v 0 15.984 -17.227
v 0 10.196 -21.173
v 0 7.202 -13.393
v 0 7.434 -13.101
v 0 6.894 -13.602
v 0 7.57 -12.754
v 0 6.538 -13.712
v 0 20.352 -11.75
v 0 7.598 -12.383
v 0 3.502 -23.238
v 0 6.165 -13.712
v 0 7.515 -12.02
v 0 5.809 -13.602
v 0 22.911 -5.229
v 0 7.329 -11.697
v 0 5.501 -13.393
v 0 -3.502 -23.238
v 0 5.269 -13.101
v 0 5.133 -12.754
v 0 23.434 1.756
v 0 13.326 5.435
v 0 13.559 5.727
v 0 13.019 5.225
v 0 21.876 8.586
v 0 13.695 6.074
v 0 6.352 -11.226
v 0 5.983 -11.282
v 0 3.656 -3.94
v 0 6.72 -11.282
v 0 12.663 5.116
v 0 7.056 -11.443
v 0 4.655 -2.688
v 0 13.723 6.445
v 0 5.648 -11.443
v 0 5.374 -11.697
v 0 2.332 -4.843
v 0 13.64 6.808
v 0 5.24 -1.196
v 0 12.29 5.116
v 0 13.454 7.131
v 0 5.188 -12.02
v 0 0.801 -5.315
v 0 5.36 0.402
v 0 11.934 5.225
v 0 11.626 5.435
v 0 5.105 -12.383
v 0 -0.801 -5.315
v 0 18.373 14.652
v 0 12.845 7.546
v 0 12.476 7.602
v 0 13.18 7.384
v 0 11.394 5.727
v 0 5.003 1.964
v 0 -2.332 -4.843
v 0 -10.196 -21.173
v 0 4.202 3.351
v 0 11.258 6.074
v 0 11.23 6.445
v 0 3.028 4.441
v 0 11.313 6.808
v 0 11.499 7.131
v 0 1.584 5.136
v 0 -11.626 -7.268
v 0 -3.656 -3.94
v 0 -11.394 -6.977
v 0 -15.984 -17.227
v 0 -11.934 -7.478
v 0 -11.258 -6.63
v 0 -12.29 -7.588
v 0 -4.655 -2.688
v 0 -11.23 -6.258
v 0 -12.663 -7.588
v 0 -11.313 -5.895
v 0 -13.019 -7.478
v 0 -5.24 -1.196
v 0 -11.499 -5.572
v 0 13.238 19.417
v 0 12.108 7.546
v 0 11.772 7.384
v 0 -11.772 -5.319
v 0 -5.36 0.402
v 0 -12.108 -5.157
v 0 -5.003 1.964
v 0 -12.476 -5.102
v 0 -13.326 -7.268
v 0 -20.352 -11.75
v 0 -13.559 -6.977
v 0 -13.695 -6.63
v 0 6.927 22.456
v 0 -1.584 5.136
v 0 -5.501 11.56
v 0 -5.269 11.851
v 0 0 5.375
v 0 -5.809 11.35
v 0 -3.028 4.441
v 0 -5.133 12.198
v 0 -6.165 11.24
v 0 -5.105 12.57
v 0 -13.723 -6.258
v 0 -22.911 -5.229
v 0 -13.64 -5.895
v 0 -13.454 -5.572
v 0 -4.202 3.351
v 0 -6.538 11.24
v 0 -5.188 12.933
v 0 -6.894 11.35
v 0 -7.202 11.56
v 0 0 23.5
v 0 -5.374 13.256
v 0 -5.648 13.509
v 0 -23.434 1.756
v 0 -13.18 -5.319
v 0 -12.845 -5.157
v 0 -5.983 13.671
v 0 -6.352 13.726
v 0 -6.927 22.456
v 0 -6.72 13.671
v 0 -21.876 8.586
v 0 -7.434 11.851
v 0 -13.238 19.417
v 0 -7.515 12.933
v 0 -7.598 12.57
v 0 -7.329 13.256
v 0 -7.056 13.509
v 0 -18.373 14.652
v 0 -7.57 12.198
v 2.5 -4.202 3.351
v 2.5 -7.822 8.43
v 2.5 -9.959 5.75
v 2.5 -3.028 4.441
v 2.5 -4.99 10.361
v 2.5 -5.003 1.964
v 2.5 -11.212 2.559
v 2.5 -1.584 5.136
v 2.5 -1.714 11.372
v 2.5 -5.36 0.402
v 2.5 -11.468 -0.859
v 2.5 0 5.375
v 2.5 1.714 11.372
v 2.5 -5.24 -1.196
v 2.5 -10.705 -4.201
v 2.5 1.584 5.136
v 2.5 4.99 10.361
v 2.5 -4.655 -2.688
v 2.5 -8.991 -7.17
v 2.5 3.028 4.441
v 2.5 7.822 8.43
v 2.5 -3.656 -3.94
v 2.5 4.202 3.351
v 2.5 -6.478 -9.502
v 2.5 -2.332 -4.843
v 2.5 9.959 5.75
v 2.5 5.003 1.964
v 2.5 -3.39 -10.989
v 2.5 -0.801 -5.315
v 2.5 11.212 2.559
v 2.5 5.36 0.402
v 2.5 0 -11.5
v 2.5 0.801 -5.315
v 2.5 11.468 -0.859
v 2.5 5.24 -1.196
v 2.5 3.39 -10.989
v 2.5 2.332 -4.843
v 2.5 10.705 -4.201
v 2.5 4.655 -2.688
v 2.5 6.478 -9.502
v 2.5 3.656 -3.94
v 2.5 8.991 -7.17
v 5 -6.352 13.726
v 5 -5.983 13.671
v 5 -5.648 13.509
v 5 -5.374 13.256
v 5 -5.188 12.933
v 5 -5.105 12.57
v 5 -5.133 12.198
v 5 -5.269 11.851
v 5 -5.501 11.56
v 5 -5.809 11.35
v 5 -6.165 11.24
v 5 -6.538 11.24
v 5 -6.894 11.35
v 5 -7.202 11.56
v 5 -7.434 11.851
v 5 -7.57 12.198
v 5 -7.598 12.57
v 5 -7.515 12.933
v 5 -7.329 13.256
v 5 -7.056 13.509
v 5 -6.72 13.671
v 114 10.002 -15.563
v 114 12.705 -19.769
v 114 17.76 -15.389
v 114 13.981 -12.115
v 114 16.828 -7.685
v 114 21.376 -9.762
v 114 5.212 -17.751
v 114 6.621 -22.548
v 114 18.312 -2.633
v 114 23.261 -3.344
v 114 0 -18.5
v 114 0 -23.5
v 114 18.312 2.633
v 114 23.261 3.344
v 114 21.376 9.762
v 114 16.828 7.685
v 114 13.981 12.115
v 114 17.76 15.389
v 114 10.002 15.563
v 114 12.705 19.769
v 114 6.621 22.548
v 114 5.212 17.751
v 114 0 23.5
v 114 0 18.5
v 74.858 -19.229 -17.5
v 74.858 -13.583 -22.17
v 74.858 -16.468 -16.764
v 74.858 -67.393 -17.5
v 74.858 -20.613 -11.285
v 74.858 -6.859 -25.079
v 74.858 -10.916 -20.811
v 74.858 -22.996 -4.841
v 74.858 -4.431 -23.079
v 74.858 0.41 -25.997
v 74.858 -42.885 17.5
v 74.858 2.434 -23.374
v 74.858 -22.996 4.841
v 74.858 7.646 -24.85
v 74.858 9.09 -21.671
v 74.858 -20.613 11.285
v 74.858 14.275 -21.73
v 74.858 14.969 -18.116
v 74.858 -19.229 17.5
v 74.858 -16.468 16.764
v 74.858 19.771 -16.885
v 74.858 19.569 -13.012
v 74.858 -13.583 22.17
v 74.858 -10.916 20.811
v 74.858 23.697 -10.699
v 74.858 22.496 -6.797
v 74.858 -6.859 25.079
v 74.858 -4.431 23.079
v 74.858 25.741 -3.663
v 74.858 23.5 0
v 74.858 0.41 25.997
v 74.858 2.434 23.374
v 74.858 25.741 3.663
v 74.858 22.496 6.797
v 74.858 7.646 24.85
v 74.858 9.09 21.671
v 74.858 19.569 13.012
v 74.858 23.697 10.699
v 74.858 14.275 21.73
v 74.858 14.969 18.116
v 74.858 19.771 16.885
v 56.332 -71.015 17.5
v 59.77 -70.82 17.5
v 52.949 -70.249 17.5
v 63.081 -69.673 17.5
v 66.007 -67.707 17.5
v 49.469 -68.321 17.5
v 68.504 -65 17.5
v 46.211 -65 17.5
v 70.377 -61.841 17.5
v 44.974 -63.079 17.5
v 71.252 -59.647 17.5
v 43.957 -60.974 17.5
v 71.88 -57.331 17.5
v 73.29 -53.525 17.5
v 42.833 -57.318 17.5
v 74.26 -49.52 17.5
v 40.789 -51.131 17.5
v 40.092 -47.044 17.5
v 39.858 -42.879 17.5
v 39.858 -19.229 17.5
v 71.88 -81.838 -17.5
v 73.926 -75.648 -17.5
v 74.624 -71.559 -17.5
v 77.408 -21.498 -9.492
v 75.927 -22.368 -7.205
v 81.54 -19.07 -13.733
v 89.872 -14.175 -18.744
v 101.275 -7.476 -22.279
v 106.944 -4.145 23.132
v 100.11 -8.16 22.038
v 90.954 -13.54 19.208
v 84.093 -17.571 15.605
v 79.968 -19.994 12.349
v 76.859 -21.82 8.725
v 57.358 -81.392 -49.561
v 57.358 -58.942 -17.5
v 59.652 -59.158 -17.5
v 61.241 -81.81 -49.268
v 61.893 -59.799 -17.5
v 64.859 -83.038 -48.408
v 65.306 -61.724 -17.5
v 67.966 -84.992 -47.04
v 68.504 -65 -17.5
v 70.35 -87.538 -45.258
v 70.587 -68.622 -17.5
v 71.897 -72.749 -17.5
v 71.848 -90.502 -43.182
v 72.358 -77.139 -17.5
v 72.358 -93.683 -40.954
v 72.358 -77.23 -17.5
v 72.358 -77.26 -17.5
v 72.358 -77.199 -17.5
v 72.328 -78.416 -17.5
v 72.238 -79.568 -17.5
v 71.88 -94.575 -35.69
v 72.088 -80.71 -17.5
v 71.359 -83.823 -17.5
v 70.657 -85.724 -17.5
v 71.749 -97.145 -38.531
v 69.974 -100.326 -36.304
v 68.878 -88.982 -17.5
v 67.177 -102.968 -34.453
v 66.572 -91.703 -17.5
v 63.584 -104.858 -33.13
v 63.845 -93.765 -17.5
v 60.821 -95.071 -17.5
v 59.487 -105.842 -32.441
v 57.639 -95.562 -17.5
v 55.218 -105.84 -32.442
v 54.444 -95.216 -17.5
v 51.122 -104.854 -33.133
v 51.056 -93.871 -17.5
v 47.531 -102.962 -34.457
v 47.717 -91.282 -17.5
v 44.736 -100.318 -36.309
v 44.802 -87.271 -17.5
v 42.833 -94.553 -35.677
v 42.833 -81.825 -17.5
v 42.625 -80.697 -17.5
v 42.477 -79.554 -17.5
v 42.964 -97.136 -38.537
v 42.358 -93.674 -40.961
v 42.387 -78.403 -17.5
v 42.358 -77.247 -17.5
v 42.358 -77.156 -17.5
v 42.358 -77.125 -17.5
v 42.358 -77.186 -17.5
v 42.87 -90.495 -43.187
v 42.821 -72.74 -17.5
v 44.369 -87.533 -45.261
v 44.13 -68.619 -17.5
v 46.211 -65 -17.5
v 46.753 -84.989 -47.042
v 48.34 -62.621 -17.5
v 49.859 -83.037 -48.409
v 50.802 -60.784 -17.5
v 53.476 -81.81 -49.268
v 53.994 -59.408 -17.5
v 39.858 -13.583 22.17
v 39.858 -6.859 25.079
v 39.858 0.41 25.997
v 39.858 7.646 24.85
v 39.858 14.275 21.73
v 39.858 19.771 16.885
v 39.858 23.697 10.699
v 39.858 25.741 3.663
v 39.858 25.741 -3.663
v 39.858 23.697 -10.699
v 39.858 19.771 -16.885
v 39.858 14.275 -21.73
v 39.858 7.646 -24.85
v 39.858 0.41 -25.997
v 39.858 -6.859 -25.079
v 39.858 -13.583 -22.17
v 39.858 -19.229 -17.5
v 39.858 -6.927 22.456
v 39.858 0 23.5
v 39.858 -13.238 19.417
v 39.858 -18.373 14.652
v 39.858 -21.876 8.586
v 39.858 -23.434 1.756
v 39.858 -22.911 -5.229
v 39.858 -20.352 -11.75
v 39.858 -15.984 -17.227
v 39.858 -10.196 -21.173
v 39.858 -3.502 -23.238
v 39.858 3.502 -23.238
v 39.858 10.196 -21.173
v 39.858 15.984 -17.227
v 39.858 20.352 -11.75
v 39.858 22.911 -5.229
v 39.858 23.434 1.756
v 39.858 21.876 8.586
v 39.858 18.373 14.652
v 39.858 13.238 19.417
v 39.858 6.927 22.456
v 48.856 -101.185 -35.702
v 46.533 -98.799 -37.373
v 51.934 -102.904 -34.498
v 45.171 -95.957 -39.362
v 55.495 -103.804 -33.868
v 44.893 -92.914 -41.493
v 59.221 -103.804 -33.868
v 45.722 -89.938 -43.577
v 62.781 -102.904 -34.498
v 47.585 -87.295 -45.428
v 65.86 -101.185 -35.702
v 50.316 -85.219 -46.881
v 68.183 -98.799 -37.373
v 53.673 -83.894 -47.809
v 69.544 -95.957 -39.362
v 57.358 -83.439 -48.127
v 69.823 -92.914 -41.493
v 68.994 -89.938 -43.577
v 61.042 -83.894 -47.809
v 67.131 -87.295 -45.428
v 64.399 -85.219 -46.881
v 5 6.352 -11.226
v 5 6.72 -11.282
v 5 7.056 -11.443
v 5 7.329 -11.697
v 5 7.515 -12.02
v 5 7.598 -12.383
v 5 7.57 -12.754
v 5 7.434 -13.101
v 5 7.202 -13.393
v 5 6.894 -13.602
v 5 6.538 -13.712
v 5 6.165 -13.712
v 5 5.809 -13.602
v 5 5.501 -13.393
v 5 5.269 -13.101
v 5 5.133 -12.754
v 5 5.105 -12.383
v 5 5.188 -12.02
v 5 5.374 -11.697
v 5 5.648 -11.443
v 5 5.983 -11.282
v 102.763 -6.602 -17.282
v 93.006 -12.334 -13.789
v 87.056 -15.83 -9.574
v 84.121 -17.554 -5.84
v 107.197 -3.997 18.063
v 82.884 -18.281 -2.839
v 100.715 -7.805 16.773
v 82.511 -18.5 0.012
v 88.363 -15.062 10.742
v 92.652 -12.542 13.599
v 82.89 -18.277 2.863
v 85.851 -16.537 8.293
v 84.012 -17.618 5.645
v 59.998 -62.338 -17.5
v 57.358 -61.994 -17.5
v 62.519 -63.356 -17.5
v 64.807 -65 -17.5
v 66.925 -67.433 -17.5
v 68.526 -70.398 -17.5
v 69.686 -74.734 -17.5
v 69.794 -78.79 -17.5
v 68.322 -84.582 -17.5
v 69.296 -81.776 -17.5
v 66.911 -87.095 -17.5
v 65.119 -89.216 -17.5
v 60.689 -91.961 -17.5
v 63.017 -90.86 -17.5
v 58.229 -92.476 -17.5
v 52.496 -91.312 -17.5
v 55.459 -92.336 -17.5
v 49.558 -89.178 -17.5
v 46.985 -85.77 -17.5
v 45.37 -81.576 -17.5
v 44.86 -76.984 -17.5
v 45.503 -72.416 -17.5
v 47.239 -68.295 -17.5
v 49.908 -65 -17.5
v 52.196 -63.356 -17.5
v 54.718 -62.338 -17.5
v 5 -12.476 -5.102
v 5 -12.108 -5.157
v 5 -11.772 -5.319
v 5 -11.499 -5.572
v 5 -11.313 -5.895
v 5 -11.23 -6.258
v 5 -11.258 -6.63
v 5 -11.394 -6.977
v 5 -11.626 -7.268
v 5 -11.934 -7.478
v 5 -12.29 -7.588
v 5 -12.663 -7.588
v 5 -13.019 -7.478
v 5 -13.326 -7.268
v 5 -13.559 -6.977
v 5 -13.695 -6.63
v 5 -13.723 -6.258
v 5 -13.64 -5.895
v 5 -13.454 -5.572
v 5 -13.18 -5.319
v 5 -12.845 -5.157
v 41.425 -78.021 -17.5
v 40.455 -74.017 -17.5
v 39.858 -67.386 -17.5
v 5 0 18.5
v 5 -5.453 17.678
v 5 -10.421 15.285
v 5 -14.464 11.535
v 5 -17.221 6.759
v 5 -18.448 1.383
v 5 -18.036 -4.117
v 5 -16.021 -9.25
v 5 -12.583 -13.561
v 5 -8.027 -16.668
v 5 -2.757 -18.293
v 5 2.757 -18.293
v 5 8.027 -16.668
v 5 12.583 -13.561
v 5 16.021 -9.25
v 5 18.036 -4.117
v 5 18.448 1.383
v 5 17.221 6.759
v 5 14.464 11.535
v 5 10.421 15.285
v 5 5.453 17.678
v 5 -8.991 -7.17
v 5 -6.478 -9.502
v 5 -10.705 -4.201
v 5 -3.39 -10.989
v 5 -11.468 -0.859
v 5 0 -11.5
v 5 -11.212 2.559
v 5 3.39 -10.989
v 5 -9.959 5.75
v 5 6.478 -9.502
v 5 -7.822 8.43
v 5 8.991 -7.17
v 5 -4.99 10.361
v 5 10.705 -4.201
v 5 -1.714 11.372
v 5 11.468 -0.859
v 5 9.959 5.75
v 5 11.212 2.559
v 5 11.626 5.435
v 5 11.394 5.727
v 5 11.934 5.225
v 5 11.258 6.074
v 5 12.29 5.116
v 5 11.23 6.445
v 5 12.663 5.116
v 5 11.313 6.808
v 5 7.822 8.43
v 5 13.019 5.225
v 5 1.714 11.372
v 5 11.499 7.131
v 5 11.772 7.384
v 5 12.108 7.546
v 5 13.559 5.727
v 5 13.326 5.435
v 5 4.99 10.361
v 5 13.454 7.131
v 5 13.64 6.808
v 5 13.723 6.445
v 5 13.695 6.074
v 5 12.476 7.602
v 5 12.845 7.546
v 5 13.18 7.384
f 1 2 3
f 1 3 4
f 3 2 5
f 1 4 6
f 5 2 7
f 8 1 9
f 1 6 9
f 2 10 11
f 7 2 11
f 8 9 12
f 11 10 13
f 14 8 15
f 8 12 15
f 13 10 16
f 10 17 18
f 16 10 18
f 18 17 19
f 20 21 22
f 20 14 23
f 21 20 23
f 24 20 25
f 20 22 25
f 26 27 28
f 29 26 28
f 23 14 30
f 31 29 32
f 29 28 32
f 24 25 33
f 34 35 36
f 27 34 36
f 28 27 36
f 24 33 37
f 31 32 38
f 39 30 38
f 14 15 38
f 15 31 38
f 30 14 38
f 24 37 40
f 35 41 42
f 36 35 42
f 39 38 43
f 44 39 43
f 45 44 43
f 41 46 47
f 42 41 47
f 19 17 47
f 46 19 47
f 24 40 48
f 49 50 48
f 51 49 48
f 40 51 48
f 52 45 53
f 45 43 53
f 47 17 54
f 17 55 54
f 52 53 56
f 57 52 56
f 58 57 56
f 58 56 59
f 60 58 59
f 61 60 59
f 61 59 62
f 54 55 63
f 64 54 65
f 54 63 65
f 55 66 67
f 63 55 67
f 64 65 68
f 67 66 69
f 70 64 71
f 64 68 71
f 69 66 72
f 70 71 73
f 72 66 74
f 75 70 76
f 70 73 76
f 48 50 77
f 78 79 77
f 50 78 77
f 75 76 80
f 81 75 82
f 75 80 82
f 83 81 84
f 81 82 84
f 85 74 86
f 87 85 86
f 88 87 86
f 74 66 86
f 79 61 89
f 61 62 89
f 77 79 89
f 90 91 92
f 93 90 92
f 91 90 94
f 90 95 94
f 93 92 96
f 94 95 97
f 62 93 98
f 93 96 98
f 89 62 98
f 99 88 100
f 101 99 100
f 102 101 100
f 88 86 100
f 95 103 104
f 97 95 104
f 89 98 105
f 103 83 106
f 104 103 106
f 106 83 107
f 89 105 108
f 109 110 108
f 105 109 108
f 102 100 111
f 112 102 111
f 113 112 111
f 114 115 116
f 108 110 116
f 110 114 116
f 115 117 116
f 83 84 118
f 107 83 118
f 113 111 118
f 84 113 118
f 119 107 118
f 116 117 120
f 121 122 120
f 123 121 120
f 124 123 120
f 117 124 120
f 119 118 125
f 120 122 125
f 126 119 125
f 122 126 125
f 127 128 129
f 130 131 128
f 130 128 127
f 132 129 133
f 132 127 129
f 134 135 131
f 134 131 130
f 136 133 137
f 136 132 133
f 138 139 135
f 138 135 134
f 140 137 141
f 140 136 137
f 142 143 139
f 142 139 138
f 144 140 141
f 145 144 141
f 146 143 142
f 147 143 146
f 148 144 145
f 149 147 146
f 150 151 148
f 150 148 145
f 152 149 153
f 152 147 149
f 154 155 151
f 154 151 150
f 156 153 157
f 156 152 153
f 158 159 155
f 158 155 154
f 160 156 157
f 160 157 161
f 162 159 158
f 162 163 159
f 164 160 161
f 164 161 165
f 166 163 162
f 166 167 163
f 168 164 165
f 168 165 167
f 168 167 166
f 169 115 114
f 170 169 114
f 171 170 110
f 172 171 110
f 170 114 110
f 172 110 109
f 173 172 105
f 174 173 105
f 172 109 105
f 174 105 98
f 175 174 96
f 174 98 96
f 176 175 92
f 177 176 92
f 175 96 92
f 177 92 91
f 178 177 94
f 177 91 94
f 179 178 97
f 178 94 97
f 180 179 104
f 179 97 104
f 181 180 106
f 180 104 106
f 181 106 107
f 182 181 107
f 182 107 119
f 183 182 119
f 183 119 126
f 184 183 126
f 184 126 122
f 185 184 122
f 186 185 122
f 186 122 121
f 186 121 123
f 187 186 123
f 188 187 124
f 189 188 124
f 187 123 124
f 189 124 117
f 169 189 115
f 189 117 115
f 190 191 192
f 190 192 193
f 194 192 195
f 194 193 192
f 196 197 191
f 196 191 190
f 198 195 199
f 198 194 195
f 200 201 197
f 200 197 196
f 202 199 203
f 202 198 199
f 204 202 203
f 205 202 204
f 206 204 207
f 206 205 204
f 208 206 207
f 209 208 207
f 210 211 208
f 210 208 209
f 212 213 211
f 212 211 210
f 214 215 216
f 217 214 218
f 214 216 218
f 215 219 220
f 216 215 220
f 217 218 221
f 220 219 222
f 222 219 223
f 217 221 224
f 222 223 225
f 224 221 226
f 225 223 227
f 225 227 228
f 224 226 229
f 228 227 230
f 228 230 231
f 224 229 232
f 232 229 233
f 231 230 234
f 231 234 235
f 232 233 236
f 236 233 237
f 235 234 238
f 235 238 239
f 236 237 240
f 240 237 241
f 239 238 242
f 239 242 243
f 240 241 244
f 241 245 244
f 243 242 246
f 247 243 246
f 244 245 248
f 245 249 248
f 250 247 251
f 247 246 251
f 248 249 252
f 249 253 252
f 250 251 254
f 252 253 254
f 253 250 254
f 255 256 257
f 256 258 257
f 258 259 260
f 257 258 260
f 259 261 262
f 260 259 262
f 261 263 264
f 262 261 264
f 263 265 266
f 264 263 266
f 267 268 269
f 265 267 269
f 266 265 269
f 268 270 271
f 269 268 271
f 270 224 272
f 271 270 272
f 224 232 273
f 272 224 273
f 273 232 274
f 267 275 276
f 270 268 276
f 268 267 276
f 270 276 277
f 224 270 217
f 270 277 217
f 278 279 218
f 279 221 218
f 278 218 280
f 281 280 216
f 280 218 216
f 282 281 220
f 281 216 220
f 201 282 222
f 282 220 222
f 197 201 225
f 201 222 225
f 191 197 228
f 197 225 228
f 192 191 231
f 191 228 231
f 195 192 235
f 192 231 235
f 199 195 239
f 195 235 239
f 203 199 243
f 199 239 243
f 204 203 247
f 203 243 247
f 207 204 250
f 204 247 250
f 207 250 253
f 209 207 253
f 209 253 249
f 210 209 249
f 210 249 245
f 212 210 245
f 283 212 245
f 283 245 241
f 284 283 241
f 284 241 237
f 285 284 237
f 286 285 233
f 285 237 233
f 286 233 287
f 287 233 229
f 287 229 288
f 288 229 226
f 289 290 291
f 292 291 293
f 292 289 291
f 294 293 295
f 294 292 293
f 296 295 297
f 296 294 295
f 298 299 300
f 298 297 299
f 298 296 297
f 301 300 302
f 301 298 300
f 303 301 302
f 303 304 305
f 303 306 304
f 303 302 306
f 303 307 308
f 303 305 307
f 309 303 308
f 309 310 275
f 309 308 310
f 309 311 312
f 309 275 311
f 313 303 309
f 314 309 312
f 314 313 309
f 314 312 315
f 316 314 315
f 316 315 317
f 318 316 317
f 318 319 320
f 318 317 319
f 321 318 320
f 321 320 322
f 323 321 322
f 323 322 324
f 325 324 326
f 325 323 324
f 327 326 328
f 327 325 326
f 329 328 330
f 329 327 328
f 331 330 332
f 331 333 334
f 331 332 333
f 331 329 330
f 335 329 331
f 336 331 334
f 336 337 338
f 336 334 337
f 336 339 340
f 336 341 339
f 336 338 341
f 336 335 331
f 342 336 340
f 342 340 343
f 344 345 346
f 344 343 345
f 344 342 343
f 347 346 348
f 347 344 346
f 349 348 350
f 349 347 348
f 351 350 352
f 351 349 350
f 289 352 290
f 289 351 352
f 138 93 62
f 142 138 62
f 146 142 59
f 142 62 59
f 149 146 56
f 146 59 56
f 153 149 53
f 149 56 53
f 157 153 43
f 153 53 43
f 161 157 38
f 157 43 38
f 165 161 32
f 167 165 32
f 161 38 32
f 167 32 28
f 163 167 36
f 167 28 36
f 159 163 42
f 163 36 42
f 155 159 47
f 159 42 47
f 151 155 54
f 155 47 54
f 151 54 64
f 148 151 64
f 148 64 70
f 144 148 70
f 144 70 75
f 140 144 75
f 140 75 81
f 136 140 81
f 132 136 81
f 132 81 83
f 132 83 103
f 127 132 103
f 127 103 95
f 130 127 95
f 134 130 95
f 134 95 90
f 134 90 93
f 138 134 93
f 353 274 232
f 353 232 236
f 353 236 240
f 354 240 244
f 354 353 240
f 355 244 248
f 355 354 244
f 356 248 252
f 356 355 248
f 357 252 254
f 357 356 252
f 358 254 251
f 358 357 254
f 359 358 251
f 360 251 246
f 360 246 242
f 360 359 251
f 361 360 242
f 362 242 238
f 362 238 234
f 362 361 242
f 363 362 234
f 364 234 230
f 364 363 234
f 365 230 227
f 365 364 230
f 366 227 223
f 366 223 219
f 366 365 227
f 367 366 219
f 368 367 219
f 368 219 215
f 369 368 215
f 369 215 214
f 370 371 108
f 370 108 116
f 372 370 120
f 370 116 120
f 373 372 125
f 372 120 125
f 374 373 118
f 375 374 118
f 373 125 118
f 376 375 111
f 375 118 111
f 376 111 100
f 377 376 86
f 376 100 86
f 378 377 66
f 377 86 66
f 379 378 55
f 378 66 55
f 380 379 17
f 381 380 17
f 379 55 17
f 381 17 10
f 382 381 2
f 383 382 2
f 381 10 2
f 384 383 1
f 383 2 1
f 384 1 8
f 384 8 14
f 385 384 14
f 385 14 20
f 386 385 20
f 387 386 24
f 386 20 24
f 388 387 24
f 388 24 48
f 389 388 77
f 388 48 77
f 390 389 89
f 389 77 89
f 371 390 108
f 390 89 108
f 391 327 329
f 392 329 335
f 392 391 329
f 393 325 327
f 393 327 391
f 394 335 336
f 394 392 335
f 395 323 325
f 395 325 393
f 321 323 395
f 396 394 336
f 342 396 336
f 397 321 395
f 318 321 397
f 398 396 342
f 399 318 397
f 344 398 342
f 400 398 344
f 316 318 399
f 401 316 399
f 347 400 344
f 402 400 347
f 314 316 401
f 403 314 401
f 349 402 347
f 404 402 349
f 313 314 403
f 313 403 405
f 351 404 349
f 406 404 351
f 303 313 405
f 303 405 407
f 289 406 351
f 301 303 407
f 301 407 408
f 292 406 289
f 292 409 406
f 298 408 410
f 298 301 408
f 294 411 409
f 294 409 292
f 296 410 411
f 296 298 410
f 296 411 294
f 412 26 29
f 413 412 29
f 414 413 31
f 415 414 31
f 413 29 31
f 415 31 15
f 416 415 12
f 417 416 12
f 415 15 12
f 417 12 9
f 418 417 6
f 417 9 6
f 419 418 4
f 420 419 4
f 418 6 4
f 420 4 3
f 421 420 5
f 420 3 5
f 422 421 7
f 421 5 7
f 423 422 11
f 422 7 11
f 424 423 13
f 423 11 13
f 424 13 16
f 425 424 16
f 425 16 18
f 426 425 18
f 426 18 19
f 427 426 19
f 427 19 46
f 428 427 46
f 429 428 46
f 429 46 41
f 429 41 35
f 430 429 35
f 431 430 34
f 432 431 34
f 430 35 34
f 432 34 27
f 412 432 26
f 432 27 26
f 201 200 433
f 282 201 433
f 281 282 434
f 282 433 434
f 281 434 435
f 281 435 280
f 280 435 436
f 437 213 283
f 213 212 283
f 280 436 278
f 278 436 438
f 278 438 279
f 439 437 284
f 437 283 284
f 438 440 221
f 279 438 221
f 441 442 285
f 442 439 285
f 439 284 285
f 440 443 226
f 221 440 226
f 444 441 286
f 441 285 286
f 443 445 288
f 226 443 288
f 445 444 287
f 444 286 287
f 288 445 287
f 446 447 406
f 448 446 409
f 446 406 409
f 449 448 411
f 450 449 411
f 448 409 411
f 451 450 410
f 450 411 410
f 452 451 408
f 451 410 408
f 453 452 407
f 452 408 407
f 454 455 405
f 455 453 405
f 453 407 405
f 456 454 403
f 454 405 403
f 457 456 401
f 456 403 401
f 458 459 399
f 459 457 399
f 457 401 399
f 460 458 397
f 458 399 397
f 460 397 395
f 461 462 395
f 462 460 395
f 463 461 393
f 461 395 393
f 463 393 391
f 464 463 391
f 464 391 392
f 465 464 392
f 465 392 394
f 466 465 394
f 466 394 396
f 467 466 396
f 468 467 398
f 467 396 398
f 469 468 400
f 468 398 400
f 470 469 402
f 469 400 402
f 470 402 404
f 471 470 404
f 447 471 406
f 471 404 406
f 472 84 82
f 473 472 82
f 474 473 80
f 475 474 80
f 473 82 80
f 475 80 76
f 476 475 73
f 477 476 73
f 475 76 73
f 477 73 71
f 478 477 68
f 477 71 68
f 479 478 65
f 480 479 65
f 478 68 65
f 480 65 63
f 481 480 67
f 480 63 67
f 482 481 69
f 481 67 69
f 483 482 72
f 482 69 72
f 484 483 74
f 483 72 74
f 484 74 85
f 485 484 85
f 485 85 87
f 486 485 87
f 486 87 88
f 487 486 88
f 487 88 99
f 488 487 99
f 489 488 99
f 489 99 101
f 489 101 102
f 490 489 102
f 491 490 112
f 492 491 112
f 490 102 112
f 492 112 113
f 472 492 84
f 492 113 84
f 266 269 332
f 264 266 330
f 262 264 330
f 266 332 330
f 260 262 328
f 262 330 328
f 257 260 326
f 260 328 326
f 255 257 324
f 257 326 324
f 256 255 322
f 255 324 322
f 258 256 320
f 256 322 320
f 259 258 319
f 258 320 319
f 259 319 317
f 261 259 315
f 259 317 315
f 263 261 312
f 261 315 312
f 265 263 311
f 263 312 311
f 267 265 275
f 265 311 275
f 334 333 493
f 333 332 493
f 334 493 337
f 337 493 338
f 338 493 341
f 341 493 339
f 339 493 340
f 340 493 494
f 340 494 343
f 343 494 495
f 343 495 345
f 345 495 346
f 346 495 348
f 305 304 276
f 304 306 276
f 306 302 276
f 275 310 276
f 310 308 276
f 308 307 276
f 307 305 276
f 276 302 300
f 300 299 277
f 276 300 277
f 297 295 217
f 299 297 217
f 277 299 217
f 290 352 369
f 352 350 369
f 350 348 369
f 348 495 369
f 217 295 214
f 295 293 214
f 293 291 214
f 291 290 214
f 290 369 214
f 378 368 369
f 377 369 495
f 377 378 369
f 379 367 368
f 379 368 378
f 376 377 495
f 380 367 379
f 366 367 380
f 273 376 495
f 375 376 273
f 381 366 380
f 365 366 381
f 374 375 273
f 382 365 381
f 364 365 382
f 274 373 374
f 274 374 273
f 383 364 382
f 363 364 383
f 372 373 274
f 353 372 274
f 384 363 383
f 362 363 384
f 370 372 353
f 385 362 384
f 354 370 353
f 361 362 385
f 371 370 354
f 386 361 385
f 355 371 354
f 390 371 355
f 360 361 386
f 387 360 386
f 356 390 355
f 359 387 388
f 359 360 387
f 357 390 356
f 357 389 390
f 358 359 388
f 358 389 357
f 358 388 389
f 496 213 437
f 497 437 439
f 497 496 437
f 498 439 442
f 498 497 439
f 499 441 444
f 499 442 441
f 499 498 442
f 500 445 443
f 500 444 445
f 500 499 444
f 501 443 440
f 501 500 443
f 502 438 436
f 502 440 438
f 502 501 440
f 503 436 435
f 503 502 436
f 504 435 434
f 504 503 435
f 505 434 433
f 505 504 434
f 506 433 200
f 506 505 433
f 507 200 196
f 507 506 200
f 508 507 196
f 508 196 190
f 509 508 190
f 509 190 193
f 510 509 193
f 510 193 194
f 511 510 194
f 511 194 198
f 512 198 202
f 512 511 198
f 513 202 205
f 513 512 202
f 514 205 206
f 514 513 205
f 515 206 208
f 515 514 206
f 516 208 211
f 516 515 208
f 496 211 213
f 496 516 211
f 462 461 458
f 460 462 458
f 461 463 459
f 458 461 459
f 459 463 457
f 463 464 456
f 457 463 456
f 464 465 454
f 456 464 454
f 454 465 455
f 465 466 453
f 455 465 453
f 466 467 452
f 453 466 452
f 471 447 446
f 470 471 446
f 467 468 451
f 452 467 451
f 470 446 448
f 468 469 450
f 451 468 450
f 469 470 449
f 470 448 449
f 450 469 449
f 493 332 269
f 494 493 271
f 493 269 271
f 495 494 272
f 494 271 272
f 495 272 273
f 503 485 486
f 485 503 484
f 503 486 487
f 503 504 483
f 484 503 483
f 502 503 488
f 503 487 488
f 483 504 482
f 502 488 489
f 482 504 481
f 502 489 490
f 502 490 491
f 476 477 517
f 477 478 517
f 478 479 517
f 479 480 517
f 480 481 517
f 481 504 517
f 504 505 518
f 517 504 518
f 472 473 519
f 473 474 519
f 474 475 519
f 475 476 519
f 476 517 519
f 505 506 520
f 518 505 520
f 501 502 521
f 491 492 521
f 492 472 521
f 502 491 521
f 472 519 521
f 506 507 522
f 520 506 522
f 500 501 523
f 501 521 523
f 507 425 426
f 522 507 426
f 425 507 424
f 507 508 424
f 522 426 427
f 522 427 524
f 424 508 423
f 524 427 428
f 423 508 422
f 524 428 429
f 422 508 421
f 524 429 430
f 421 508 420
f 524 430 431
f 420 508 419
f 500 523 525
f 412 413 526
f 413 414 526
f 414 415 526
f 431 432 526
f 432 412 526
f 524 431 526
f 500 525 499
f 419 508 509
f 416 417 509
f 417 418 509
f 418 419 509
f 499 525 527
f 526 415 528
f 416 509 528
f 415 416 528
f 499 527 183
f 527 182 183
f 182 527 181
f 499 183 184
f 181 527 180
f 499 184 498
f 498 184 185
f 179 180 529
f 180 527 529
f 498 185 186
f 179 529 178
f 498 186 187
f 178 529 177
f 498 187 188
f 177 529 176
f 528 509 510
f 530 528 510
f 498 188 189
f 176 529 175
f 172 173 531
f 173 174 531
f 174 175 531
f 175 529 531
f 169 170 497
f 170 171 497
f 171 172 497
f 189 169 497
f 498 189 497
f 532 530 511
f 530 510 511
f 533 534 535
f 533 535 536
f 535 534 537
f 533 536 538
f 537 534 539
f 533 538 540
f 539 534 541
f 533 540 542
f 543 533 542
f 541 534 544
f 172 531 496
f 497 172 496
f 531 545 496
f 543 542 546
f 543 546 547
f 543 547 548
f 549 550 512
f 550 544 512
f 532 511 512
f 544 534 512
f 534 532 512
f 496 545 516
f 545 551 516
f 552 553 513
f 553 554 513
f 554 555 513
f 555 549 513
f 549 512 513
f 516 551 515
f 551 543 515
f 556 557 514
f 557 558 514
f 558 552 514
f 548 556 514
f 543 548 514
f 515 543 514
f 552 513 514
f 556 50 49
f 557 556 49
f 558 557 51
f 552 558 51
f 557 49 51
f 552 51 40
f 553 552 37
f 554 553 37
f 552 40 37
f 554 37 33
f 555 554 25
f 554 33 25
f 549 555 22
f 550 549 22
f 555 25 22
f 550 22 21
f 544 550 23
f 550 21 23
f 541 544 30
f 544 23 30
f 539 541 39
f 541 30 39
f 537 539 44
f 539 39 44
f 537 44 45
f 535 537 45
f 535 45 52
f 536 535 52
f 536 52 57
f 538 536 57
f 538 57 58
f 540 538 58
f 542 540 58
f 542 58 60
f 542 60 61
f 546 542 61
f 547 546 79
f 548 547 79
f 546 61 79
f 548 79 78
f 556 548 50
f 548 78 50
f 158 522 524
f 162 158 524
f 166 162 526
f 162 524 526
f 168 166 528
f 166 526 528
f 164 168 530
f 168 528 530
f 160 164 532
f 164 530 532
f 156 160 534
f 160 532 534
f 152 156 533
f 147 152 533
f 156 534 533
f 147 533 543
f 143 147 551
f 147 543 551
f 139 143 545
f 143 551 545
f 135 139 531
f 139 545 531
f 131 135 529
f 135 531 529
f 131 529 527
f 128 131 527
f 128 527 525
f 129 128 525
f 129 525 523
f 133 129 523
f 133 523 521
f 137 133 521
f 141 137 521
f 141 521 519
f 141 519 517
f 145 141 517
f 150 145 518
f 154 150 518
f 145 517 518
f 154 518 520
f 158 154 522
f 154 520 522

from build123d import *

# Parameters (mm, degrees)
CROQUIS1_R              = 23.5
CROQUIS1_R_2            = 18.5
SALIENTE_EXTRUIR1_DEPTH = 114
CROQUIS2_R              = 23.5
CROQUIS2_R_2            = 5.375
CROQUIS2_R_3            = 1.25
SALIENTE_EXTRUIR2_DEPTH = 5
CORTAR_EXTRUIR1_DEPTH   = 23.5
CROQUIS6_R              = 11.5
CORTAR_EXTRUIR2_DEPTH   = 2.5
CROQUIS17_W             = 35
CROQUIS17_H             = 35
SALIENTE_EXTRUIR3_DEPTH = 65
CROQUIS18_R             = 15
CROQUIS18_R_2           = 12.5
SALIENTE_EXTRUIR4_DEPTH = 70
CROQUIS26_W             = 35
CROQUIS26_H             = 35
SALIENTE_EXTRUIR8_DEPTH = 40
CORTAR_EXTRUIR4_DEPTH   = 167.48351172
CROQUIS27_R             = 26
SALIENTE_EXTRUIR9_DEPTH = 35
CORTAR_EXTRUIR7_START   = -35
CROQUIS28_R             = 18.5
CORTAR_EXTRUIR7_DEPTH   = 35
CROQUIS25_W             = 17.40616007
CROQUIS25_H             = 44.473979809
CORTAR_EXTRUIR8_DEPTH   = 35
REDONDEO7_R             = 25


with BuildPart() as part:
    # Croquis1 → Saliente-Extruir1 (new body)
    with BuildSketch(Plane(origin=(0, 0, 0), x_dir=(0, 0, -1), z_dir=(1, 0, 0))):
        with Locations(Location((0, 0, 0), (0, 0, 180))):
            Circle(CROQUIS1_R)
        with Locations(Location((0, 0, 0), (0, 0, 180))):
            Circle(CROQUIS1_R_2, mode=Mode.SUBTRACT)
    extrude(amount=SALIENTE_EXTRUIR1_DEPTH)

    # Croquis2 → Saliente-Extruir2 (add)
    with BuildSketch(Plane.ZY):
        Circle(CROQUIS2_R)
        Circle(CROQUIS2_R_2, mode=Mode.SUBTRACT)
        with Locations((-12.476232327, 6.351663319)):
            Circle(CROQUIS2_R_3, mode=Mode.SUBTRACT)
        with Locations((-6.351663319, -12.476232327)):
            Circle(CROQUIS2_R_3, mode=Mode.SUBTRACT)
        with Locations((12.476232327, -6.351663319)):
            Circle(CROQUIS2_R_3, mode=Mode.SUBTRACT)
        with Locations((6.351663319, 12.476232327)):
            Circle(CROQUIS2_R_3, mode=Mode.SUBTRACT)
    extrude(amount=-SALIENTE_EXTRUIR2_DEPTH)

    # Croquis4 → Cortar-Extruir1 (cut, symmetric)
    with BuildSketch(Plane.XY):
        Polygon((114, 0), (74, -23.5), (114, -23.5), align=None)
    extrude(amount=CORTAR_EXTRUIR1_DEPTH, both=True, mode=Mode.SUBTRACT)

    # Croquis6 → Cortar-Extruir2 (cut)
    with BuildSketch(Plane(origin=(5, 0, 0), x_dir=(0, 0, -1), z_dir=(1, 0, 0))):
        Circle(CROQUIS6_R)
    extrude(amount=-CORTAR_EXTRUIR2_DEPTH, mode=Mode.SUBTRACT)

    # Croquis17 → Saliente-Extruir3 (add)
    with BuildSketch(Plane(origin=(0, 0, 0), x_dir=(1, 0, 0), z_dir=(0, 1, 0))):
        with Locations((57.357864376, 0)):
            Rectangle(CROQUIS17_W, CROQUIS17_H)
    extrude(amount=-SALIENTE_EXTRUIR3_DEPTH)

    # Croquis18 → Saliente-Extruir4 (add)
    with BuildSketch(Plane(origin=(57.357864376, -93.678821818, -40.957602214), x_dir=(-1, 0, 0), z_dir=(-3.776705924582896e-15, -0.5735764363510474, -0.8191520442889909))):
        with Locations(Location((0, 0, 0), (0, 0, 90))):
            Circle(CROQUIS18_R)
        with Locations(Location((0, 0, 0), (0, 0, 90))):
            Circle(CROQUIS18_R_2, mode=Mode.SUBTRACT)
    extrude(amount=-SALIENTE_EXTRUIR4_DEPTH)

    # Croquis26 → Saliente-Extruir8 (add)
    with BuildSketch(Plane.XZ.offset(65)):
        with Locations((57.357864376, 0)):
            Rectangle(CROQUIS26_W, CROQUIS26_H)
    extrude(amount=SALIENTE_EXTRUIR8_DEPTH)

    # Croquis23 → Cortar-Extruir4 (cut, through all)
    with BuildSketch(Plane(origin=(0, -50.063167159, -71.49761239), x_dir=(-0.9999999349220849, 0.0002955264288911758, -0.00020692983324517575), z_dir=(-3.786088196428006e-15, -0.5735764363510474, -0.819152044288991))):
        with BuildLine():
            Line((-72.377069861, -53.224186351), (-106.285107353, -53.224186351))
            ThreePointArc((-106.285107353, -53.224186351), (-57.377069861, -102.132223842), (-8.46903237, -53.224186351))
            Line((-8.46903237, -53.224186351), (-42.377069861, -53.224186351))
            ThreePointArc((-42.377069861, -53.224186351), (-57.377069861, -68.224186351), (-72.377069861, -53.224186351))
        make_face()
    extrude(amount=-CORTAR_EXTRUIR4_DEPTH, mode=Mode.SUBTRACT)

    # Chaflán1
    # the kernel refuses this chamfer: 5 mm, written as the material it adds along each edge
    with BuildSketch(Plane(origin=(72.3578634, -83.748374972, -26.766019567), x_dir=(0.9996432935674607, 0.021877427608148432, -0.015318739727867424), z_dir=(3.786088196428006e-15, 0.5735764363510474, 0.8191520442889909))) as chafl_n1_piece_1_section:
        with BuildLine():
            Line((4.52468849, 0), (-0.739014204, -3.853882904))
            Line((-0.739014204, -3.853882904), (-0.835126609, -3.826271211))
            ThreePointArc((-0.835126609, -3.826271211), (-0.28053556, -1.941134087), (-0.099963359, 0.002706805))
            Line((-0.099963359, 0.002706805), (0.002706805, 0.099963359))
            ThreePointArc((0.002706805, 0.099963359), (2.263393477, 0.038748553), (4.527395295, 0.099963359))
            Line((4.527395295, 0.099963359), (4.52468849, 0))
        make_face()
    chafl_n1_piece_1 = extrude(amount=65.350553059, mode=Mode.PRIVATE)
    chafl_n1_piece_1 = split(chafl_n1_piece_1, bisect_by=Plane(origin=(74.857864376, -66.861949612, -0.210272202), z_dir=(-1, 0, 0)), keep=Keep.TOP, mode=Mode.PRIVATE)
    chafl_n1_piece_1 = split(chafl_n1_piece_1, bisect_by=Plane(origin=(73.269162948, -66.861949612, -17.5), z_dir=(0, 0, 1)), keep=Keep.TOP, mode=Mode.PRIVATE)
    chafl_n1_piece_1 = split(chafl_n1_piece_1, bisect_by=Plane(origin=(73.269162948, -66.861949612, 17.5), z_dir=(0, 0, -1)), keep=Keep.TOP, mode=Mode.PRIVATE)
    chafl_n1_piece_1 = split(chafl_n1_piece_1, bisect_by=Plane(origin=(73.269162948, -54.679062597, 17.188693604), z_dir=(-3.776705924582896e-15, -0.5735764363510474, -0.8191520442889909)), keep=Keep.TOP, mode=Mode.PRIVATE)
    add(chafl_n1_piece_1)
    with BuildSketch(Plane(origin=(72.3578634, -83.748374972, -26.766019567), x_dir=(0.9996432935674607, 0.021877427608148432, -0.015318739727867424), z_dir=(3.786088196428006e-15, 0.5735764363510474, 0.8191520442889909))) as chafl_n1_piece_2_section:
        with BuildLine():
            Line((4.52468849, 0), (-0.739014204, -3.853882904))
            Line((-0.739014204, -3.853882904), (-0.835126609, -3.826271211))
            ThreePointArc((-0.835126609, -3.826271211), (-0.28053556, -1.941134087), (-0.099963359, 0.002706805))
            Line((-0.099963359, 0.002706805), (0.002706805, 0.099963359))
            ThreePointArc((0.002706805, 0.099963359), (2.263393477, 0.038748553), (4.527395295, 0.099963359))
            Line((4.527395295, 0.099963359), (4.52468849, 0))
        make_face()
    chafl_n1_piece_2 = extrude(amount=65.350553059, mode=Mode.PRIVATE)
    chafl_n1_piece_2 = split(chafl_n1_piece_2, bisect_by=Plane(origin=(72.413190885, -56.144513508, 17.5), z_dir=(0, 0, 1)), keep=Keep.TOP, mode=Mode.PRIVATE)
    chafl_n1_piece_2 = split(chafl_n1_piece_2, bisect_by=Plane(origin=(72.413190885, -55.943525833, 18.074080294), z_dir=(-3.776705924582896e-15, -0.5735764363510474, -0.8191520442889909)), keep=Keep.TOP, mode=Mode.PRIVATE)
    add(chafl_n1_piece_2)
    with BuildSketch(Plane(origin=(72.3578634, -83.748374972, -26.766019567), x_dir=(0.9996432935674607, 0.021877427608148432, -0.015318739727867424), z_dir=(3.786088196428006e-15, 0.5735764363510474, 0.8191520442889909))) as chafl_n1_piece_3_section:
        with BuildLine():
            Line((4.52468849, 0), (-0.739014204, -3.853882904))
            Line((-0.739014204, -3.853882904), (-0.835126609, -3.826271211))
            ThreePointArc((-0.835126609, -3.826271211), (-0.28053556, -1.941134087), (-0.099963359, 0.002706805))
            Line((-0.099963359, 0.002706805), (0.002706805, 0.099963359))
            ThreePointArc((0.002706805, 0.099963359), (2.263393477, 0.038748553), (4.527395295, 0.099963359))
            Line((4.527395295, 0.099963359), (4.52468849, 0))
        make_face()
    chafl_n1_piece_3 = extrude(amount=65.350553059, mode=Mode.PRIVATE)
    chafl_n1_piece_3 = split(chafl_n1_piece_3, bisect_by=Plane(origin=(74.857864376, -53.740671542, 17.111139805), z_dir=(-1, 0, 0)), keep=Keep.TOP, mode=Mode.PRIVATE)
    chafl_n1_piece_3 = split(chafl_n1_piece_3, bisect_by=Plane(origin=(73.550120659, -53.740671542, 17.5), z_dir=(0, 0, -1)), keep=Keep.TOP, mode=Mode.PRIVATE)
    chafl_n1_piece_3 = split(chafl_n1_piece_3, bisect_by=Plane(origin=(73.550120659, -54.012954381, 16.72227961), z_dir=(3.776705924582896e-15, 0.5735764363510474, 0.8191520442889909)), keep=Keep.TOP, mode=Mode.PRIVATE)
    add(chafl_n1_piece_3)
    with BuildSketch(Plane(origin=(42.357865352, -83.735162365, -26.766019567), x_dir=(-0.9996237628252937, 0.022468263900174177, -0.01573244775338249), z_dir=(3.786088196428006e-15, 0.5735764363510474, 0.8191520442889909))) as chafl_n1_piece_4_section:
        with BuildLine():
            Line((4.52468849, 0), (-0.739014204, 3.853882904))
            Line((-0.739014204, 3.853882904), (-0.835126609, 3.826271211))
            ThreePointArc((-0.835126609, 3.826271211), (-0.28053556, 1.941134087), (-0.099963359, -0.002706805))
            Line((-0.099963359, -0.002706805), (0.002706805, -0.099963359))
            ThreePointArc((0.002706805, -0.099963359), (2.263393477, -0.038748553), (4.527395295, -0.099963359))
            Line((4.527395295, -0.099963359), (4.52468849, 0))
        make_face()
    chafl_n1_piece_4 = extrude(amount=65.350553059, mode=Mode.PRIVATE)
    chafl_n1_piece_4 = split(chafl_n1_piece_4, bisect_by=Plane(origin=(41.445758281, -66.849730794, -17.5), z_dir=(0, 0, 1)), keep=Keep.TOP, mode=Mode.PRIVATE)
    chafl_n1_piece_4 = split(chafl_n1_piece_4, bisect_by=Plane(origin=(39.857864376, -66.849730794, -0.212642444), z_dir=(1, 0, 0)), keep=Keep.TOP, mode=Mode.PRIVATE)
    chafl_n1_piece_4 = split(chafl_n1_piece_4, bisect_by=Plane(origin=(41.445758281, -66.849730794, 17.5), z_dir=(0, 0, -1)), keep=Keep.TOP, mode=Mode.PRIVATE)
    chafl_n1_piece_4 = split(chafl_n1_piece_4, bisect_by=Plane(origin=(41.445758281, -54.669749998, 17.182172852), z_dir=(-3.776705924582896e-15, -0.5735764363510474, -0.8191520442889909)), keep=Keep.TOP, mode=Mode.PRIVATE)
    add(chafl_n1_piece_4)
    with BuildSketch(Plane(origin=(42.357865352, -83.735162365, -26.766019567), x_dir=(-0.9996237628252937, 0.022468263900174177, -0.01573244775338249), z_dir=(3.786088196428006e-15, 0.5735764363510474, 0.8191520442889909))) as chafl_n1_piece_5_section:
        with BuildLine():
            Line((4.52468849, 0), (-0.739014204, 3.853882904))
            Line((-0.739014204, 3.853882904), (-0.835126609, 3.826271211))
            ThreePointArc((-0.835126609, 3.826271211), (-0.28053556, 1.941134087), (-0.099963359, -0.002706805))
            Line((-0.099963359, -0.002706805), (0.002706805, -0.099963359))
            ThreePointArc((0.002706805, -0.099963359), (2.263393477, -0.038748553), (4.527395295, -0.099963359))
            Line((4.527395295, -0.099963359), (4.52468849, 0))
        make_face()
    chafl_n1_piece_5 = extrude(amount=65.350553059, mode=Mode.PRIVATE)
    chafl_n1_piece_5 = split(chafl_n1_piece_5, bisect_by=Plane(origin=(42.30505322, -56.139333536, 17.5), z_dir=(0, 0, 1)), keep=Keep.TOP, mode=Mode.PRIVATE)
    chafl_n1_piece_5 = split(chafl_n1_piece_5, bisect_by=Plane(origin=(42.30505322, -55.939365699, 18.071167337), z_dir=(-3.776705924582896e-15, -0.5735764363510474, -0.8191520442889909)), keep=Keep.TOP, mode=Mode.PRIVATE)
    add(chafl_n1_piece_5)
    with BuildSketch(Plane(origin=(42.357865352, -83.735162365, -26.766019567), x_dir=(-0.9996237628252937, 0.022468263900174177, -0.01573244775338249), z_dir=(3.786088196428006e-15, 0.5735764363510474, 0.8191520442889909))) as chafl_n1_piece_6_section:
        with BuildLine():
            Line((4.52468849, 0), (-0.739014204, 3.853882904))
            Line((-0.739014204, 3.853882904), (-0.835126609, 3.826271211))
            ThreePointArc((-0.835126609, 3.826271211), (-0.28053556, 1.941134087), (-0.099963359, -0.002706805))
            Line((-0.099963359, -0.002706805), (0.002706805, -0.099963359))
            ThreePointArc((0.002706805, -0.099963359), (2.263393477, -0.038748553), (4.527395295, -0.099963359))
            Line((4.527395295, -0.099963359), (4.52468849, 0))
        make_face()
    chafl_n1_piece_6 = extrude(amount=65.350553059, mode=Mode.PRIVATE)
    chafl_n1_piece_6 = split(chafl_n1_piece_6, bisect_by=Plane(origin=(39.857864376, -53.732391069, 17.108811543), z_dir=(1, 0, 0)), keep=Keep.TOP, mode=Mode.PRIVATE)
    chafl_n1_piece_6 = split(chafl_n1_piece_6, bisect_by=Plane(origin=(41.16543505, -53.732391069, 17.5), z_dir=(0, 0, -1)), keep=Keep.TOP, mode=Mode.PRIVATE)
    chafl_n1_piece_6 = split(chafl_n1_piece_6, bisect_by=Plane(origin=(41.16543505, -54.006304175, 16.717623086), z_dir=(3.776705924582896e-15, 0.5735764363510474, 0.8191520442889909)), keep=Keep.TOP, mode=Mode.PRIVATE)
    add(chafl_n1_piece_6)

    # Croquis27 → Saliente-Extruir9 (add)
    with BuildSketch(Plane.ZY.offset(-39.857864376)):
        Circle(CROQUIS27_R)
    extrude(amount=-SALIENTE_EXTRUIR9_DEPTH)

    # Croquis28 → Cortar-Extruir7 (cut)
    with BuildSketch(Plane(origin=(74.857864376, 0, 0), x_dir=(0, 0, -1), z_dir=(1, 0, 0)).offset(CORTAR_EXTRUIR7_START)):
        with Locations(Location((0, 0, 0), (0, 0, 180))):
            Circle(CROQUIS28_R)
    extrude(amount=CORTAR_EXTRUIR7_DEPTH, mode=Mode.SUBTRACT)

    # Croquis25 → Cortar-Extruir8 (cut)
    with BuildSketch(Plane.ZY.offset(-39.857864376)):
        with Locations((26.203080035, -59.941786128)):
            Rectangle(CROQUIS25_W, CROQUIS25_H)
    extrude(amount=-CORTAR_EXTRUIR8_DEPTH, mode=Mode.SUBTRACT)

    # Redondeo7
    # the kernel refuses this fillet: 25 mm, written as the material it takes off along each edge
    with BuildSketch(Plane(origin=(74.857864376, -92.687057178, -37.012402739), x_dir=(-0.7907902899042683, -0.5013924657655986, 0.3510787841305944), z_dir=(0, 0.5735764363510114, 0.8191520442890161))) as redondeo7_piece_1:
        with BuildLine():
            CenterArc((13.937730496, -22.836907045), REDONDEO7_R, 114.009742732, 28.249684026)
            Line((-5.832026752, -7.534727515), (-6.227421897, -7.228683925))
            Line((-6.227421897, -7.228683925), (-0.395395145, 0.306043591))
            Line((-0.395395145, 0.306043591), (0, 0.5))
            ThreePointArc((0, 0.5), (1.882715511, 0.5), (3.561985032, 0.456738141))
            Line((3.561985032, 0.456738141), (3.765431021, 0))
        make_face()
    extrude(amount=90.367601464, mode=Mode.SUBTRACT)
    with BuildSketch(Plane(origin=(39.857864376, -40.84904598, 36.999342745), x_dir=(0.7903484372835544, -0.5018597340768438, 0.3514059689244948), z_dir=(0, -0.5735764363510115, -0.819152044289016))) as redondeo7_piece_2:
        with BuildLine():
            CenterArc((13.925156189, -22.841917455), REDONDEO7_R, 113.98150583, 28.236579598)
            Line((-5.833554743, -7.525477193), (-6.228728961, -7.219148388))
            Line((-6.228728961, -7.219148388), (-0.395174219, 0.306328805))
            Line((-0.395174219, 0.306328805), (0, 0.5))
            ThreePointArc((0, 0.5), (1.882056296, 0.5), (3.56089172, 0.456838349))
            Line((3.56089172, 0.456838349), (3.764112592, 0))
        make_face()
    extrude(amount=90.335714849, mode=Mode.SUBTRACT)


solid = part.part
